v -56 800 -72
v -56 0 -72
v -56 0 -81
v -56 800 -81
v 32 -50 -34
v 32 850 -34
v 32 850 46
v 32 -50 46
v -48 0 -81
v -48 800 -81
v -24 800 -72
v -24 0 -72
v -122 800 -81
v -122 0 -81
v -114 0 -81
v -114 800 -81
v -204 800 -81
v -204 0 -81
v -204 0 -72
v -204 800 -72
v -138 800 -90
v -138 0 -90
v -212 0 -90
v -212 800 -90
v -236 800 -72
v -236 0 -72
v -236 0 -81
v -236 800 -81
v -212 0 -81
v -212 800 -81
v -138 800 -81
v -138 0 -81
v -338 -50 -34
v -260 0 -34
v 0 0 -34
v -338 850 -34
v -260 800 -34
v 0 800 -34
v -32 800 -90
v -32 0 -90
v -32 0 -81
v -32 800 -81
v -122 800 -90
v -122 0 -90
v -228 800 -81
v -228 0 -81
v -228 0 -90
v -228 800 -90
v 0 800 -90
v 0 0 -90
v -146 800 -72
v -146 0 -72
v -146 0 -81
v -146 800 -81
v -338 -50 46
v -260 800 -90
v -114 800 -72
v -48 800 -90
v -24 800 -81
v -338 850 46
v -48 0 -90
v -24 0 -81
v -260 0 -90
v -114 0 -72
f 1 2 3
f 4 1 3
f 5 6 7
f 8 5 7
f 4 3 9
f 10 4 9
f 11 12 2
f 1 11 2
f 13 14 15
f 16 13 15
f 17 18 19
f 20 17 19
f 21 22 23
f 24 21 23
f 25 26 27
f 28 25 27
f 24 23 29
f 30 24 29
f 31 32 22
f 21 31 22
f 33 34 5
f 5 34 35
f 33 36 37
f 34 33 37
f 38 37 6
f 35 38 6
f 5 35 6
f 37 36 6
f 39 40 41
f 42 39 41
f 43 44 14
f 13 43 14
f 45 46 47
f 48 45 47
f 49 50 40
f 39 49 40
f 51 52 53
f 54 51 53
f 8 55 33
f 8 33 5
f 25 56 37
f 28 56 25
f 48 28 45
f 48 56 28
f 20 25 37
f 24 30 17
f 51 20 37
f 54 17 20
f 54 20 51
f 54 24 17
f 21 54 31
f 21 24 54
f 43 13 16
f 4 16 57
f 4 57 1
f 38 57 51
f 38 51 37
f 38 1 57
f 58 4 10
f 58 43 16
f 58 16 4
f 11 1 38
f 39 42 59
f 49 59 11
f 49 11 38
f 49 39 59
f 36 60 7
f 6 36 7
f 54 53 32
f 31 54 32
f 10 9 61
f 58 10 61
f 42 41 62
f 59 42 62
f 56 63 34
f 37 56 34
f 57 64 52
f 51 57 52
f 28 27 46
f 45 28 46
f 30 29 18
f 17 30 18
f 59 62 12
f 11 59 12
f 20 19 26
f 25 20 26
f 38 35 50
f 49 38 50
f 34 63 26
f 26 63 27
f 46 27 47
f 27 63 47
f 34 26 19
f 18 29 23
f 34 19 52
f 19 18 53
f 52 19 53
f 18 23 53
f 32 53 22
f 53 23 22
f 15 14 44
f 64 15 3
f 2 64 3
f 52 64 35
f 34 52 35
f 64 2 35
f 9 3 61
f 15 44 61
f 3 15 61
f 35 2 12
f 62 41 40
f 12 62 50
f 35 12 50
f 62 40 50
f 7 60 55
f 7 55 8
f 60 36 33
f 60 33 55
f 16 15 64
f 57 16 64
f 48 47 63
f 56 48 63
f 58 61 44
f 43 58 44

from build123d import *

# Parameters (mm, degrees)
BOSS_EXTRUDE1_DEPTH      = 800
BOSS_EXTRUDE2_DEPTH      = 50
BOSS_EXTRUDE2_DEPTH_BACK = 850
SKETCH2_W                = 370
SKETCH2_H                = 80


with BuildPart() as part:
    # Sketch1 → Boss-Extrude1 (new body)
    with BuildSketch(Plane(origin=(0, 0, 0), x_dir=(1, 0, 0), z_dir=(0, 1, 0))):
        Polygon((-228, 90), (-260, 90), (-260, 0), (0, 0), (0, 90), (-32, 90), (-32, 81), (-24, 81), (-24, 72), (-56, 72), (-56, 81), (-48, 81), (-48, 90), (-122, 90), (-122, 81), (-114, 81), (-114, 72), (-146, 72), (-146, 81), (-138, 81), (-138, 90), (-212, 90), (-212, 81), (-204, 81), (-204, 72), (-236, 72), (-236, 81), (-228, 81), align=None)
    extrude(amount=BOSS_EXTRUDE1_DEPTH)

    # Sketch2 → Boss-Extrude2 (add, two sides: drawn at the far end of the back side and taken through both)
    with BuildSketch(Plane.XZ.offset(-BOSS_EXTRUDE2_DEPTH_BACK)):
        with Locations((-153, 6)):
            Rectangle(SKETCH2_W, SKETCH2_H)
    extrude(amount=BOSS_EXTRUDE2_DEPTH + BOSS_EXTRUDE2_DEPTH_BACK)


solid = part.part
